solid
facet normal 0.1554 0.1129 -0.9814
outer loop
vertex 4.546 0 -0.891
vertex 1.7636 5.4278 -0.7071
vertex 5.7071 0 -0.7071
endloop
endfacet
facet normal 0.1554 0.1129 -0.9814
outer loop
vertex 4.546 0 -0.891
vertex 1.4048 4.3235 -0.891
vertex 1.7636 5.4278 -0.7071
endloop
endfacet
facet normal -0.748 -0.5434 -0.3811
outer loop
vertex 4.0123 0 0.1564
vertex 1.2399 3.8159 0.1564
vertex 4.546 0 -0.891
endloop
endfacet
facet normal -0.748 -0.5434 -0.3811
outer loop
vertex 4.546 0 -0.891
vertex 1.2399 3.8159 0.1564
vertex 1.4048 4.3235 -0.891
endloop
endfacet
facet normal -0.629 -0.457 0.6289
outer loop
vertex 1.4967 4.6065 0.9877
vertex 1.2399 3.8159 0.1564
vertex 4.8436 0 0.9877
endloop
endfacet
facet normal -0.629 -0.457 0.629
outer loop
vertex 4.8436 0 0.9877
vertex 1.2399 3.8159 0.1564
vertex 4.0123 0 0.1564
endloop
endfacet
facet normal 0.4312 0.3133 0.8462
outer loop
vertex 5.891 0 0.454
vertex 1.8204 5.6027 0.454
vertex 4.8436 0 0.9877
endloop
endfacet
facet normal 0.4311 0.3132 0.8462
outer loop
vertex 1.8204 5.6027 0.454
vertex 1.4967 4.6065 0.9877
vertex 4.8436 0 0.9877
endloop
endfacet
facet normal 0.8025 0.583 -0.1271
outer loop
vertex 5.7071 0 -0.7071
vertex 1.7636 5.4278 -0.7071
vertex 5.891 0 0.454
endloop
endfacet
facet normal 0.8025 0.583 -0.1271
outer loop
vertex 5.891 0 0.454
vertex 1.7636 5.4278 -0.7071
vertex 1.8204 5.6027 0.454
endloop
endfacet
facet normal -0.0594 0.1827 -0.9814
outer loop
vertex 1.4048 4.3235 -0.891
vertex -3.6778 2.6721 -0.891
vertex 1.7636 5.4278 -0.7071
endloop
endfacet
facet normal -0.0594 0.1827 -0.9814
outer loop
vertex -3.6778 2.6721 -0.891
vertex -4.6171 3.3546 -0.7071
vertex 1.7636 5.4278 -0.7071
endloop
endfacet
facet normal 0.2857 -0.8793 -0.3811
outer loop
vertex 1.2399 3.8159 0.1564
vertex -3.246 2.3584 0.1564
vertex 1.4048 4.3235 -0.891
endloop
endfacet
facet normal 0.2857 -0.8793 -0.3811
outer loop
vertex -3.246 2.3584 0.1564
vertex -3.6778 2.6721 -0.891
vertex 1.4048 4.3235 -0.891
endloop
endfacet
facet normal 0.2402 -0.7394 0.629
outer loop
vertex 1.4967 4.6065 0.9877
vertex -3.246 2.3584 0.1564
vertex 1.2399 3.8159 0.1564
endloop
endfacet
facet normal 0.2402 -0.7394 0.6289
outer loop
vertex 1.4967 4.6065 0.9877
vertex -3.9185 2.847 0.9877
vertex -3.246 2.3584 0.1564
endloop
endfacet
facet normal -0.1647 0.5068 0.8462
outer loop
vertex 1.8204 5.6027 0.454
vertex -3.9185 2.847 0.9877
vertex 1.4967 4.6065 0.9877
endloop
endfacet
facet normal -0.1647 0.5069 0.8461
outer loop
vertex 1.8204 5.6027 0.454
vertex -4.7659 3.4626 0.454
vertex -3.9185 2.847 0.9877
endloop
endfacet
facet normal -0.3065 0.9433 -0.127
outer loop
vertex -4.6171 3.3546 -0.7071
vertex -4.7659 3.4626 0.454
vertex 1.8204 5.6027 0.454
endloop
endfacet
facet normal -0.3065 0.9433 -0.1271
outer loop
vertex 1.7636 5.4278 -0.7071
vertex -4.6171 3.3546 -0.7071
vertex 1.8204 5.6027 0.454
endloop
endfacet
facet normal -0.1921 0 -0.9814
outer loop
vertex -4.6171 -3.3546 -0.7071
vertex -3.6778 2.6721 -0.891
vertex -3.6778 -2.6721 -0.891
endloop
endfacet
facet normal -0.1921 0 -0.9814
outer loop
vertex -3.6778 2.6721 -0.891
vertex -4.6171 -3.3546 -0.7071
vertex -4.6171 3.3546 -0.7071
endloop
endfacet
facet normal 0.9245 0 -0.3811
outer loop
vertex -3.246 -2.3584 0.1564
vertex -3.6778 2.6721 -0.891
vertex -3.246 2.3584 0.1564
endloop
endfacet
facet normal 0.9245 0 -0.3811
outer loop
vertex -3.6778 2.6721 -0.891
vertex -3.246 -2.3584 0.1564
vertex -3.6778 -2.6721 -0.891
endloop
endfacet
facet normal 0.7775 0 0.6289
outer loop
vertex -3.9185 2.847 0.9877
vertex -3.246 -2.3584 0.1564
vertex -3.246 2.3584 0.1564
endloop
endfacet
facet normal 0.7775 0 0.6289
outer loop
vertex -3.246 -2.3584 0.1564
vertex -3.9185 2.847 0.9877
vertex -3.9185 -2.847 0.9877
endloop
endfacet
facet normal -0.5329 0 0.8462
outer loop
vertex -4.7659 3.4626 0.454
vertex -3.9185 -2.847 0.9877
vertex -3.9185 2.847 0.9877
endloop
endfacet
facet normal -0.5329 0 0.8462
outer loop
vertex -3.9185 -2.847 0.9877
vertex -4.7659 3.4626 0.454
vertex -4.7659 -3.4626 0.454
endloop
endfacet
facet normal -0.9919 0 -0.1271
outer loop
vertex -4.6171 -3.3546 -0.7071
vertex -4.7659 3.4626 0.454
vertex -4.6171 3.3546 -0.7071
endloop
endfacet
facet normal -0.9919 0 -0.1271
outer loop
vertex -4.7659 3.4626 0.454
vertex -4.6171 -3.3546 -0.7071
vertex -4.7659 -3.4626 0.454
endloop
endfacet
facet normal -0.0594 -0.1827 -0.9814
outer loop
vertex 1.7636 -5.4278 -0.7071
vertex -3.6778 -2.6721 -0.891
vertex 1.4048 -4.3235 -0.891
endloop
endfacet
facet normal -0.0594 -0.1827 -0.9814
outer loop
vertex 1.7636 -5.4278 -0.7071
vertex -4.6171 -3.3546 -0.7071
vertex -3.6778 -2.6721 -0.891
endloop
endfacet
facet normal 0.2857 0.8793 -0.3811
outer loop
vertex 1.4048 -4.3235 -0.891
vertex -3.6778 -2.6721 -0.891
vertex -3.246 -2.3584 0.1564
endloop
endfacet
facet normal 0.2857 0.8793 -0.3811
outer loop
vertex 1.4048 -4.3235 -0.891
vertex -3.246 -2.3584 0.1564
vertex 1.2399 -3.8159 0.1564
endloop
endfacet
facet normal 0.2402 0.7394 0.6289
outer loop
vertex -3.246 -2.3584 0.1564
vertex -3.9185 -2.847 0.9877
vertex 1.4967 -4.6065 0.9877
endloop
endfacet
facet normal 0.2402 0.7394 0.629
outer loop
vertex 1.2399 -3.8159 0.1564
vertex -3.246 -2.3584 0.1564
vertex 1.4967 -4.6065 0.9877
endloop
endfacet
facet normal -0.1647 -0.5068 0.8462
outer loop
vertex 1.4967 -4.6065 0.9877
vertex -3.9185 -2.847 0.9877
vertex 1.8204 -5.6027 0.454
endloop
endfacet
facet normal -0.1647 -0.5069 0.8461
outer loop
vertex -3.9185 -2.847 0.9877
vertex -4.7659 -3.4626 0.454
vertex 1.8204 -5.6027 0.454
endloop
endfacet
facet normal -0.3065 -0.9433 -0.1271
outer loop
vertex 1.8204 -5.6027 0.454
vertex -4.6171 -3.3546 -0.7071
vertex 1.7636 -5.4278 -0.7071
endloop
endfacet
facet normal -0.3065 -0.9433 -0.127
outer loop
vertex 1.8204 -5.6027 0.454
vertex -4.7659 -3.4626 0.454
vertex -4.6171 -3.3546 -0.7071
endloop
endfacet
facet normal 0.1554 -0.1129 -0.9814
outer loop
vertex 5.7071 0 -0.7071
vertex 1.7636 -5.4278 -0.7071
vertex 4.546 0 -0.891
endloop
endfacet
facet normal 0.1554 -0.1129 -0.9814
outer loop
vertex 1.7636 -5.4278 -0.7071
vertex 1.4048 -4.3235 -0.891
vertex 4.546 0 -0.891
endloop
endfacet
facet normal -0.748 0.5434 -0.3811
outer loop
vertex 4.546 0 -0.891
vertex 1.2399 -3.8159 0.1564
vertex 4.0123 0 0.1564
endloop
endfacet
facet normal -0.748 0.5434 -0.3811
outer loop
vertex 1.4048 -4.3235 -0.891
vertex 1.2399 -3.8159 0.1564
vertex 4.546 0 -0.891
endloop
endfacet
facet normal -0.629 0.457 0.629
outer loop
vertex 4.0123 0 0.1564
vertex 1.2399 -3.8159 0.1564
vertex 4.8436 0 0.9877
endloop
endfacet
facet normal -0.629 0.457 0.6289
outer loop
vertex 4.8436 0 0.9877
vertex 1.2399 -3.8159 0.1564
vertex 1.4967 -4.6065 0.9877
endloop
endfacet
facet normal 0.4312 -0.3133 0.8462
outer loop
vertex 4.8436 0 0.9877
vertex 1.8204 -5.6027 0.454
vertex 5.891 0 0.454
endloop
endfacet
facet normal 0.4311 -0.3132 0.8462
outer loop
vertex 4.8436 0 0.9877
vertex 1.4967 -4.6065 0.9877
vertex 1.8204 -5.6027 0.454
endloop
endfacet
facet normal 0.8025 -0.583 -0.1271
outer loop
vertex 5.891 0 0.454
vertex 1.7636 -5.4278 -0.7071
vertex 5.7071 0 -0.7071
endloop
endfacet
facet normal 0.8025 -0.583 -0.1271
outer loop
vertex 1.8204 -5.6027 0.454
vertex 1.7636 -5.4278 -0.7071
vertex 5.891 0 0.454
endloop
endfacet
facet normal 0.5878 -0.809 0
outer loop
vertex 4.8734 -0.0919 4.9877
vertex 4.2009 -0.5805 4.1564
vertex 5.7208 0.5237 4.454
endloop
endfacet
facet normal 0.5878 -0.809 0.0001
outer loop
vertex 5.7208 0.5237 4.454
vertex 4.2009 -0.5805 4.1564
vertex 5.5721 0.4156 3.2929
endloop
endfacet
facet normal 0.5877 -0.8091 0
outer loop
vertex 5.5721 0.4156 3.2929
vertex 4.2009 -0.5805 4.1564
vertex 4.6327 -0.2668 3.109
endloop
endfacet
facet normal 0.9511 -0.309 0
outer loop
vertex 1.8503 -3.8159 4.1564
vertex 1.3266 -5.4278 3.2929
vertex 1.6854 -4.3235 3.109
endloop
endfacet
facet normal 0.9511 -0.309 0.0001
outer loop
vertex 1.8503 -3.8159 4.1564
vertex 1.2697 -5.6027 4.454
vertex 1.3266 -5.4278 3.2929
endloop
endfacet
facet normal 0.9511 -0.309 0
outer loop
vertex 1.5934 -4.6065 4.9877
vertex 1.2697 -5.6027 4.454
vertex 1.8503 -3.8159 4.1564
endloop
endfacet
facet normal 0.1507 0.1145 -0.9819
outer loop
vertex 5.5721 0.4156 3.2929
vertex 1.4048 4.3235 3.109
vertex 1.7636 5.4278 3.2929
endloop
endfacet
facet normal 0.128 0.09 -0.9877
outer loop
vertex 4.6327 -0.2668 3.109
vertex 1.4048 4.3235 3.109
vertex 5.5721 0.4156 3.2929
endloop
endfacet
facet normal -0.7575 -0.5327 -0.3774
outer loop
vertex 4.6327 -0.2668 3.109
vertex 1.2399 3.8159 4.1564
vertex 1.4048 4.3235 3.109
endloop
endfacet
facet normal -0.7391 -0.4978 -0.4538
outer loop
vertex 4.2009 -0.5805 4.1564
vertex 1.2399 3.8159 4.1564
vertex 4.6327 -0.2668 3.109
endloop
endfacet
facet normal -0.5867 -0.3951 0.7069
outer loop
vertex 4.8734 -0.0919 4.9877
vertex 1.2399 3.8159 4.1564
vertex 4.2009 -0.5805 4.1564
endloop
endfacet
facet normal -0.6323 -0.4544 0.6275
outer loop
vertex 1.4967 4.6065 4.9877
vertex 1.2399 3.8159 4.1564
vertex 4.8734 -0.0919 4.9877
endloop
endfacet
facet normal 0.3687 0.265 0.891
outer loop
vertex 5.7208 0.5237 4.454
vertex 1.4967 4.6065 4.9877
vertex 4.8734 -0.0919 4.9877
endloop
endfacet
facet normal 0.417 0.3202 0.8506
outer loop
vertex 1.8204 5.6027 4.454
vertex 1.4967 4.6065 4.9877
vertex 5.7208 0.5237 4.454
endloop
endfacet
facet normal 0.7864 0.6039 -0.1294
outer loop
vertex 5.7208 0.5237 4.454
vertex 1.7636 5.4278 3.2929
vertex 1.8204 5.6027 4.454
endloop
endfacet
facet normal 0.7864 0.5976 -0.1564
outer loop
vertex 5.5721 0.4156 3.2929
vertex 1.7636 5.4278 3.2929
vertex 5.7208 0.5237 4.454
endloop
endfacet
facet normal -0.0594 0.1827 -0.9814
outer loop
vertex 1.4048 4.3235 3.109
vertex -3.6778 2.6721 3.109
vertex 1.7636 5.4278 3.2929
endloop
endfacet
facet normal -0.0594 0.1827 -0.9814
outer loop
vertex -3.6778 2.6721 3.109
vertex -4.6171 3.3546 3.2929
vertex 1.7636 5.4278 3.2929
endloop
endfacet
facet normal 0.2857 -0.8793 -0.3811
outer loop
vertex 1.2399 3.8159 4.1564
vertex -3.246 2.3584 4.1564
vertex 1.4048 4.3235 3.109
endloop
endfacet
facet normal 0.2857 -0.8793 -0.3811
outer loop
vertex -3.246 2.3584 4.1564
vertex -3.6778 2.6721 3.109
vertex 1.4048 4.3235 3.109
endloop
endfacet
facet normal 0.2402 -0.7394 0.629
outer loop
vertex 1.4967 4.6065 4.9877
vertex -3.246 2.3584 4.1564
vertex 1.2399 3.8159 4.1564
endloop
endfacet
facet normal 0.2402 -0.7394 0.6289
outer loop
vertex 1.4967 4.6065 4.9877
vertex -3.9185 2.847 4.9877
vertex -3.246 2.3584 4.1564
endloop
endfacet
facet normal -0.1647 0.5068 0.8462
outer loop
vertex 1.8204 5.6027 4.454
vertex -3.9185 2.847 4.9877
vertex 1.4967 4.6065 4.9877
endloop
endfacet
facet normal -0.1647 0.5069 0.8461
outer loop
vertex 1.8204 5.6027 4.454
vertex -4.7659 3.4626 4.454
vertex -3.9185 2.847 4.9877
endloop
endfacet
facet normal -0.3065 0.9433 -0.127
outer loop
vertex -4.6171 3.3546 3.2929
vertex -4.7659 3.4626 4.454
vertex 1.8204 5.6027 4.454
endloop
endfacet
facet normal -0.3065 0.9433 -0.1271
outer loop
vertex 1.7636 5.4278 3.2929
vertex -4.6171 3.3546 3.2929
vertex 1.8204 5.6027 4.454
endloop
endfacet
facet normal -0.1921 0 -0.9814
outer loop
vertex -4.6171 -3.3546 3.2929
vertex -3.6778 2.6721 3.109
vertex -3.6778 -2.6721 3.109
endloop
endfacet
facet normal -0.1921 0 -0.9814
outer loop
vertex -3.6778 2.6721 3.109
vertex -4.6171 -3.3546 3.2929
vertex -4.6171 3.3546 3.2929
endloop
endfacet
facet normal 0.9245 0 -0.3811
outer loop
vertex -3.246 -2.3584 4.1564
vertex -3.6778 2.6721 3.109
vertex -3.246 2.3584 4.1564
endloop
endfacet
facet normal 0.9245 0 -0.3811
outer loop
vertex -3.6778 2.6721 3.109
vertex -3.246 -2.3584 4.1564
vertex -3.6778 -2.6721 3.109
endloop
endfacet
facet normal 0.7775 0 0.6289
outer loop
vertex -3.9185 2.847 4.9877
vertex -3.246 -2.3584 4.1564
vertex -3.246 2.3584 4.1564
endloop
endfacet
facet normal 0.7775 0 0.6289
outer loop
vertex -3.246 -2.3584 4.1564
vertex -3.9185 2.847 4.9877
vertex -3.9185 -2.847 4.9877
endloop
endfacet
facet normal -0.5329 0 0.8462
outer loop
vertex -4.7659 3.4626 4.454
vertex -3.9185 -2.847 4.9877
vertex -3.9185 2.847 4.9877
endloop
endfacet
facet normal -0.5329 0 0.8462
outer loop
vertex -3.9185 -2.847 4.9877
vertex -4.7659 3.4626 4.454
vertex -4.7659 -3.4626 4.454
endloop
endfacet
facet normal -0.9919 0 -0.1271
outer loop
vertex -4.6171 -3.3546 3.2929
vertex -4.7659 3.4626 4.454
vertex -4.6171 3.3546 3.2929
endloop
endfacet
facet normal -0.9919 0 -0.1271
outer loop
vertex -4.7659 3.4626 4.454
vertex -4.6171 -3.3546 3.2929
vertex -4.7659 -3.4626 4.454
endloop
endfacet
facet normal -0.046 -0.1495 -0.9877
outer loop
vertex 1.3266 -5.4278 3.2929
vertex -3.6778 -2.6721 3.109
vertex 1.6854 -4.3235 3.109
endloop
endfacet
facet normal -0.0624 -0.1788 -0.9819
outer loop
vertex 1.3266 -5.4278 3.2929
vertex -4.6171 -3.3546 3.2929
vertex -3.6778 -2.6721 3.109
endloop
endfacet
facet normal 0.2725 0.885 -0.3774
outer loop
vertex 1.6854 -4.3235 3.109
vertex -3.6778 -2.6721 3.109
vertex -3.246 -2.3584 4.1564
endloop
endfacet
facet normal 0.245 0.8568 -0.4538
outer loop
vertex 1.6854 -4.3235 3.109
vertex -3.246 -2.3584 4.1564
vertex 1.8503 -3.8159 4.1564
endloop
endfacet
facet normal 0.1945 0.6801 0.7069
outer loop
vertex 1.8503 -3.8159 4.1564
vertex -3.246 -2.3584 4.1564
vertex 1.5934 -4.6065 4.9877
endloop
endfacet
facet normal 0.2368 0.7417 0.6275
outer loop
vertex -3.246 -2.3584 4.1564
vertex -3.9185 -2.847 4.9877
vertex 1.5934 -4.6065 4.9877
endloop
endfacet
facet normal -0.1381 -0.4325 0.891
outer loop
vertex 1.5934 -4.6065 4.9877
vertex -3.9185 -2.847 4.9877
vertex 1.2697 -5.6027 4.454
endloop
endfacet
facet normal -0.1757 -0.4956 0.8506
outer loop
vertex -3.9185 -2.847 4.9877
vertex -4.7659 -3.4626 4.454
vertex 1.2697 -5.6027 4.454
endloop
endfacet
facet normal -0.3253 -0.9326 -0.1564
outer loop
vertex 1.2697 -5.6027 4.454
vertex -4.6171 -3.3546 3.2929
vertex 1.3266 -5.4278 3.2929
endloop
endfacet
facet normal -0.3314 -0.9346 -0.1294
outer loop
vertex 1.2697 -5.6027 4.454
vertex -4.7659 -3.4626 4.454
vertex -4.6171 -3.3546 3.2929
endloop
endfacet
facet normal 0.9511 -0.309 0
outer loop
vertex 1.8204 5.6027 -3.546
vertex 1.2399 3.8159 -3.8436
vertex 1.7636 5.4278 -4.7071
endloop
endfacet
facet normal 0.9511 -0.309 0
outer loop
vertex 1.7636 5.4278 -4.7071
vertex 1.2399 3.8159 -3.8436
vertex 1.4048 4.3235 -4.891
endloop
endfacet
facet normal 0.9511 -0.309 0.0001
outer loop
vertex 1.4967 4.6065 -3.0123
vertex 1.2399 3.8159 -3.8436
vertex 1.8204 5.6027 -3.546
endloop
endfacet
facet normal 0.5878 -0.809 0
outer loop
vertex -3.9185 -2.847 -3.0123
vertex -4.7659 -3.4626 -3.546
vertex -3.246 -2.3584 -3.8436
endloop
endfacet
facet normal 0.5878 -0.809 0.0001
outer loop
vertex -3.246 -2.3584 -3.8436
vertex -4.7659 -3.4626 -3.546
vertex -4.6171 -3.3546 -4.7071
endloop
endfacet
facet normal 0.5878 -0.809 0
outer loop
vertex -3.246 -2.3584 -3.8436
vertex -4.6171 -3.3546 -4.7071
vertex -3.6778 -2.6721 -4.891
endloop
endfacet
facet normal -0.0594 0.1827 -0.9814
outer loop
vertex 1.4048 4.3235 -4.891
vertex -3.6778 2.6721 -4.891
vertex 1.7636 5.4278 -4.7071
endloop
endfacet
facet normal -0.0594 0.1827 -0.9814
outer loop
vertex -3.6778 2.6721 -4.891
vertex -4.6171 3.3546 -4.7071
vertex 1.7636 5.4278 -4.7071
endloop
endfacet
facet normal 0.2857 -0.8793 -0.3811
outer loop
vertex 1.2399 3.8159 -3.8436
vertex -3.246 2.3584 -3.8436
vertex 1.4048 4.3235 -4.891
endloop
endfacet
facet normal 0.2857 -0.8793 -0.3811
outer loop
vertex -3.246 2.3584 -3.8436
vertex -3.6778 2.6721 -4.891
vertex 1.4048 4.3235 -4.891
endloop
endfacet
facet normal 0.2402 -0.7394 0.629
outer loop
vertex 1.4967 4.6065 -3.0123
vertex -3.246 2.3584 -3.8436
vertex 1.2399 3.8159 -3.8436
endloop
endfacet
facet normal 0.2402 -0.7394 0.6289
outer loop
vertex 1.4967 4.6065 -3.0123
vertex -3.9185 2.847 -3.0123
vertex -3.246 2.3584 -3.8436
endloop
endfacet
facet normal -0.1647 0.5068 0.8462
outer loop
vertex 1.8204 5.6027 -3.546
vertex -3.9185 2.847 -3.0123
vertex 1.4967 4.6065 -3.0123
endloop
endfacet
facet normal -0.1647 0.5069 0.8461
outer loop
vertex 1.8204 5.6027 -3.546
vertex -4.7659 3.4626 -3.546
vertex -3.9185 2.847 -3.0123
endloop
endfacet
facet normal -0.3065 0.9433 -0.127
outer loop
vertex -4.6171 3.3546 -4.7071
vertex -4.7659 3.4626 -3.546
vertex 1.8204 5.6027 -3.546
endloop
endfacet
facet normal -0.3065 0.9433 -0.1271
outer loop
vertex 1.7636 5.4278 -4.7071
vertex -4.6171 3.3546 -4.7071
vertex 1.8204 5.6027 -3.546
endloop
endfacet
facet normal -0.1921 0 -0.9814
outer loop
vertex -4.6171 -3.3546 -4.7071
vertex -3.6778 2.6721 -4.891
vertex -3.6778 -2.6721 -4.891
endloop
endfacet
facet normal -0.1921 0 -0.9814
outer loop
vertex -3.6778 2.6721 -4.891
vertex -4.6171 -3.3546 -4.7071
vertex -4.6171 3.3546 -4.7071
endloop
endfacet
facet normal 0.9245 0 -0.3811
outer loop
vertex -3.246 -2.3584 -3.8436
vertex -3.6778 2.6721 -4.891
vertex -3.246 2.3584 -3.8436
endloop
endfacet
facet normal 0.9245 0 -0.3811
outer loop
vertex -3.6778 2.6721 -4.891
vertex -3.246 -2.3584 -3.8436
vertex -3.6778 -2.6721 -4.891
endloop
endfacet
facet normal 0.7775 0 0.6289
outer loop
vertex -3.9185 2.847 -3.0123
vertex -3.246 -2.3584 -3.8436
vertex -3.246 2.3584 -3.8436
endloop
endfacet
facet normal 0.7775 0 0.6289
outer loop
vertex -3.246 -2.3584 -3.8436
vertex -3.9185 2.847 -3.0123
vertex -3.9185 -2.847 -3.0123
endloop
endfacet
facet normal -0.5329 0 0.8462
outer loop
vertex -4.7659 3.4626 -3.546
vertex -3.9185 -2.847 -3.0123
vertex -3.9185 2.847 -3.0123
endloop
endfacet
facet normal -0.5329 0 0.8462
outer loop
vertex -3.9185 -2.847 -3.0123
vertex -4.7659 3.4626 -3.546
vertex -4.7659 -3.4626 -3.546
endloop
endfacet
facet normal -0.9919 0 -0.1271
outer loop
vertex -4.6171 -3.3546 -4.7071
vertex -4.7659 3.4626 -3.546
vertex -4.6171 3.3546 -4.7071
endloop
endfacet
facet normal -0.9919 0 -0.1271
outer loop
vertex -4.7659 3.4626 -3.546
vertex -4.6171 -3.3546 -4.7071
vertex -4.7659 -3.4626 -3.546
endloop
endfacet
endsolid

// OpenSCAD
// rotation matrix implementation
// OpenSCAD seems to do this slightly different from Wikipedia
// c.f. https://en.wikipedia.org/wiki/Rotation_matrix#Basic_rotations
function rot2Mat(rotVec, axis) =
    (len(rotVec) == 2) ?
        rot2Mat([rotVec[0], rotVec[1], 0], axis) :
    (axis == "x") ?
        [[1,              0,               0],
         [0, cos(rotVec[0]),  sin(rotVec[0])],
         [0, sin(rotVec[0]), -cos(rotVec[0])]] :
    (axis == "y") ?
        [[ cos(rotVec[1]), 0, sin(rotVec[1])],
         [              0, 1,              0],
         [-sin(rotVec[1]), 0, cos(rotVec[1])]] :
    (axis == "z") ?
        [[ cos(rotVec[2]), sin(rotVec[2]), 0],
         [-sin(rotVec[2]), cos(rotVec[2]), 0],
         [0,              0,               1]] : undef;

// convert point to 3D by setting Z to zero (if not present)
function c3D(tPoints) = 
    (len(tPoints[0]) < 3) ?
        tPoints * [[1,0,0],[0,1,0]] :
        tPoints;

// rotate [2D] points using a specificed XYZ rotation vector
function myRotate(rotation, points) =
    c3D(points) * rot2Mat(rotation, "x")
           * rot2Mat(rotation, "y")
           * rot2Mat(rotation, "z");    
    
// Determine spherical rotation for cartesian coordinates
function rToS(pt) = 
    [-acos((pt[2]) / norm(pt)), 
	 0, 
	 -atan2(pt[0],pt[1])];

// Generate a line between two points in 3D space
module line3D(p1,p2){
  translate((p1+p2)/2)
    rotate(rToS(p1-p2))
       cylinder(r=1, h=norm(p1-p2), center = true, $fn = 3);
}

// Flattens an array down one level (removing the enclosing array)
function flatten(pointArray, done=0, res=[]) =
    (done == len(pointArray)) ?
        res :
        flatten(pointArray=pointArray, done=done+1, 
            res=concat(res,pointArray[done]));

// Creates a polyhedron face
function phFace(pp, tp, base, add=0) =
    [base + add, (base+1) % pp + add,
     (((base+1) % pp) + pp + add) % tp, (base + pp + add) % tp];

function add(vecArg, scArg, res=[]) = 
    (len(res) >= len(vecArg)) ?
        res :
        add(vecArg, scArg, res=concat(res,[vecArg[len(res)]+scArg]));

// Generate an extruded polyhedron from an array of points
// boolean argument "closed" indicates whether to close up the 
// start and end polygon
module makeExtrudedPoly(ex, merge=false, trimEnds=false){
    ps = flatten(ex);
    pp = len(ex[1]); // points in one polygon
    tp = len(ex[1]) * len(ex); // total number of points
    if(!merge && !trimEnds){
        polyhedron(points=ps, faces=concat(
            [[for (i = [pp-1  : -1 :    0]) i]],
            [[for (i = [tp-pp :  1 : tp-1]) i]],
            [for (pt=[0:(len(ex)-2)])
                for(i = [0:pp-1]) phFace(pp,tp,i,pt*pp)],
            [])
        );
    } else if(trimEnds) {
        polyhedron(points=ps, faces=concat(
            [[for (i = [pp*2-1  : -1 :    pp]) i]],
            [[for (i = [tp-pp*2 :  1 : tp-pp-1]) i]],
            [for (pt=[1:(len(ex)-3)])
                for(i = [0:pp-1]) phFace(pp,tp,i,pt*pp)]));
    } else {
        polyhedron(points=ps, faces=
            [for (pt=[0:(len(ex)-1)])
                for(i = [0:pp-1]) phFace(pp,tp,i,pt*pp)]);
    }
}

// Extrude polygon along a path
module path_extrude(points, path, pos=0, merge=false, trimEnds=false, extruded=[]){
    if((len(points) > 0) && (len(path) > 0)){
        if(len(extruded) >= (len(path))){
            // extrusion is finished, so construct the object
            //echo(extruded);
            makeExtrudedPoly(extruded, merge=merge, trimEnds=trimEnds);
        } else {
            // generate points from rotating polygon
            if(merge || (pos < (len(path) - 1))){
                if((pos == 0) && (!merge)) {
                    newPts = myRotate(rToS(path[1] - path[0]),
                        points);
                    path_extrude(points=points, path=path, pos=pos+1, 
                        merge=merge, trimEnds=trimEnds,
                        extruded=concat(extruded, [add(newPts,path[pos])]));
                } else {
                    newPts = myRotate(rToS(path[(pos+1) % len(path)] 
                        - path[(pos+len(path)-1) % len(path)]),
                        points);
                    path_extrude(points=points, path=path, pos=pos+1,
                        merge=merge, trimEnds=trimEnds,
                        extruded=concat(extruded, [add(newPts,path[pos])]));
                }
            } else {
                newPts = myRotate(rToS(path[pos] - path[pos-1]),
                    points);
                path_extrude(points=points, path=path, pos=pos+1,
                    merge=merge, trimEnds=trimEnds,
                    extruded=concat(extruded, [add(newPts,path[pos])]));
            }
        }
    }
}

pi=3.14159;

myPoints = [ for(t = [0:72:359]) [cos(t+45),sin(t+45)] ];
myPath = [ for(t = [0:72:359]) 
    [5*cos(t),5*sin(t), 0] ];

path_extrude(points=myPoints, path=myPath, merge=true);

translate([0,0,4]) path_extrude(points=myPoints, path=myPath,
    merge=false);

translate([0,0,-4]) path_extrude(points=myPoints, path=myPath,
    merge=false, trimEnds=true);
